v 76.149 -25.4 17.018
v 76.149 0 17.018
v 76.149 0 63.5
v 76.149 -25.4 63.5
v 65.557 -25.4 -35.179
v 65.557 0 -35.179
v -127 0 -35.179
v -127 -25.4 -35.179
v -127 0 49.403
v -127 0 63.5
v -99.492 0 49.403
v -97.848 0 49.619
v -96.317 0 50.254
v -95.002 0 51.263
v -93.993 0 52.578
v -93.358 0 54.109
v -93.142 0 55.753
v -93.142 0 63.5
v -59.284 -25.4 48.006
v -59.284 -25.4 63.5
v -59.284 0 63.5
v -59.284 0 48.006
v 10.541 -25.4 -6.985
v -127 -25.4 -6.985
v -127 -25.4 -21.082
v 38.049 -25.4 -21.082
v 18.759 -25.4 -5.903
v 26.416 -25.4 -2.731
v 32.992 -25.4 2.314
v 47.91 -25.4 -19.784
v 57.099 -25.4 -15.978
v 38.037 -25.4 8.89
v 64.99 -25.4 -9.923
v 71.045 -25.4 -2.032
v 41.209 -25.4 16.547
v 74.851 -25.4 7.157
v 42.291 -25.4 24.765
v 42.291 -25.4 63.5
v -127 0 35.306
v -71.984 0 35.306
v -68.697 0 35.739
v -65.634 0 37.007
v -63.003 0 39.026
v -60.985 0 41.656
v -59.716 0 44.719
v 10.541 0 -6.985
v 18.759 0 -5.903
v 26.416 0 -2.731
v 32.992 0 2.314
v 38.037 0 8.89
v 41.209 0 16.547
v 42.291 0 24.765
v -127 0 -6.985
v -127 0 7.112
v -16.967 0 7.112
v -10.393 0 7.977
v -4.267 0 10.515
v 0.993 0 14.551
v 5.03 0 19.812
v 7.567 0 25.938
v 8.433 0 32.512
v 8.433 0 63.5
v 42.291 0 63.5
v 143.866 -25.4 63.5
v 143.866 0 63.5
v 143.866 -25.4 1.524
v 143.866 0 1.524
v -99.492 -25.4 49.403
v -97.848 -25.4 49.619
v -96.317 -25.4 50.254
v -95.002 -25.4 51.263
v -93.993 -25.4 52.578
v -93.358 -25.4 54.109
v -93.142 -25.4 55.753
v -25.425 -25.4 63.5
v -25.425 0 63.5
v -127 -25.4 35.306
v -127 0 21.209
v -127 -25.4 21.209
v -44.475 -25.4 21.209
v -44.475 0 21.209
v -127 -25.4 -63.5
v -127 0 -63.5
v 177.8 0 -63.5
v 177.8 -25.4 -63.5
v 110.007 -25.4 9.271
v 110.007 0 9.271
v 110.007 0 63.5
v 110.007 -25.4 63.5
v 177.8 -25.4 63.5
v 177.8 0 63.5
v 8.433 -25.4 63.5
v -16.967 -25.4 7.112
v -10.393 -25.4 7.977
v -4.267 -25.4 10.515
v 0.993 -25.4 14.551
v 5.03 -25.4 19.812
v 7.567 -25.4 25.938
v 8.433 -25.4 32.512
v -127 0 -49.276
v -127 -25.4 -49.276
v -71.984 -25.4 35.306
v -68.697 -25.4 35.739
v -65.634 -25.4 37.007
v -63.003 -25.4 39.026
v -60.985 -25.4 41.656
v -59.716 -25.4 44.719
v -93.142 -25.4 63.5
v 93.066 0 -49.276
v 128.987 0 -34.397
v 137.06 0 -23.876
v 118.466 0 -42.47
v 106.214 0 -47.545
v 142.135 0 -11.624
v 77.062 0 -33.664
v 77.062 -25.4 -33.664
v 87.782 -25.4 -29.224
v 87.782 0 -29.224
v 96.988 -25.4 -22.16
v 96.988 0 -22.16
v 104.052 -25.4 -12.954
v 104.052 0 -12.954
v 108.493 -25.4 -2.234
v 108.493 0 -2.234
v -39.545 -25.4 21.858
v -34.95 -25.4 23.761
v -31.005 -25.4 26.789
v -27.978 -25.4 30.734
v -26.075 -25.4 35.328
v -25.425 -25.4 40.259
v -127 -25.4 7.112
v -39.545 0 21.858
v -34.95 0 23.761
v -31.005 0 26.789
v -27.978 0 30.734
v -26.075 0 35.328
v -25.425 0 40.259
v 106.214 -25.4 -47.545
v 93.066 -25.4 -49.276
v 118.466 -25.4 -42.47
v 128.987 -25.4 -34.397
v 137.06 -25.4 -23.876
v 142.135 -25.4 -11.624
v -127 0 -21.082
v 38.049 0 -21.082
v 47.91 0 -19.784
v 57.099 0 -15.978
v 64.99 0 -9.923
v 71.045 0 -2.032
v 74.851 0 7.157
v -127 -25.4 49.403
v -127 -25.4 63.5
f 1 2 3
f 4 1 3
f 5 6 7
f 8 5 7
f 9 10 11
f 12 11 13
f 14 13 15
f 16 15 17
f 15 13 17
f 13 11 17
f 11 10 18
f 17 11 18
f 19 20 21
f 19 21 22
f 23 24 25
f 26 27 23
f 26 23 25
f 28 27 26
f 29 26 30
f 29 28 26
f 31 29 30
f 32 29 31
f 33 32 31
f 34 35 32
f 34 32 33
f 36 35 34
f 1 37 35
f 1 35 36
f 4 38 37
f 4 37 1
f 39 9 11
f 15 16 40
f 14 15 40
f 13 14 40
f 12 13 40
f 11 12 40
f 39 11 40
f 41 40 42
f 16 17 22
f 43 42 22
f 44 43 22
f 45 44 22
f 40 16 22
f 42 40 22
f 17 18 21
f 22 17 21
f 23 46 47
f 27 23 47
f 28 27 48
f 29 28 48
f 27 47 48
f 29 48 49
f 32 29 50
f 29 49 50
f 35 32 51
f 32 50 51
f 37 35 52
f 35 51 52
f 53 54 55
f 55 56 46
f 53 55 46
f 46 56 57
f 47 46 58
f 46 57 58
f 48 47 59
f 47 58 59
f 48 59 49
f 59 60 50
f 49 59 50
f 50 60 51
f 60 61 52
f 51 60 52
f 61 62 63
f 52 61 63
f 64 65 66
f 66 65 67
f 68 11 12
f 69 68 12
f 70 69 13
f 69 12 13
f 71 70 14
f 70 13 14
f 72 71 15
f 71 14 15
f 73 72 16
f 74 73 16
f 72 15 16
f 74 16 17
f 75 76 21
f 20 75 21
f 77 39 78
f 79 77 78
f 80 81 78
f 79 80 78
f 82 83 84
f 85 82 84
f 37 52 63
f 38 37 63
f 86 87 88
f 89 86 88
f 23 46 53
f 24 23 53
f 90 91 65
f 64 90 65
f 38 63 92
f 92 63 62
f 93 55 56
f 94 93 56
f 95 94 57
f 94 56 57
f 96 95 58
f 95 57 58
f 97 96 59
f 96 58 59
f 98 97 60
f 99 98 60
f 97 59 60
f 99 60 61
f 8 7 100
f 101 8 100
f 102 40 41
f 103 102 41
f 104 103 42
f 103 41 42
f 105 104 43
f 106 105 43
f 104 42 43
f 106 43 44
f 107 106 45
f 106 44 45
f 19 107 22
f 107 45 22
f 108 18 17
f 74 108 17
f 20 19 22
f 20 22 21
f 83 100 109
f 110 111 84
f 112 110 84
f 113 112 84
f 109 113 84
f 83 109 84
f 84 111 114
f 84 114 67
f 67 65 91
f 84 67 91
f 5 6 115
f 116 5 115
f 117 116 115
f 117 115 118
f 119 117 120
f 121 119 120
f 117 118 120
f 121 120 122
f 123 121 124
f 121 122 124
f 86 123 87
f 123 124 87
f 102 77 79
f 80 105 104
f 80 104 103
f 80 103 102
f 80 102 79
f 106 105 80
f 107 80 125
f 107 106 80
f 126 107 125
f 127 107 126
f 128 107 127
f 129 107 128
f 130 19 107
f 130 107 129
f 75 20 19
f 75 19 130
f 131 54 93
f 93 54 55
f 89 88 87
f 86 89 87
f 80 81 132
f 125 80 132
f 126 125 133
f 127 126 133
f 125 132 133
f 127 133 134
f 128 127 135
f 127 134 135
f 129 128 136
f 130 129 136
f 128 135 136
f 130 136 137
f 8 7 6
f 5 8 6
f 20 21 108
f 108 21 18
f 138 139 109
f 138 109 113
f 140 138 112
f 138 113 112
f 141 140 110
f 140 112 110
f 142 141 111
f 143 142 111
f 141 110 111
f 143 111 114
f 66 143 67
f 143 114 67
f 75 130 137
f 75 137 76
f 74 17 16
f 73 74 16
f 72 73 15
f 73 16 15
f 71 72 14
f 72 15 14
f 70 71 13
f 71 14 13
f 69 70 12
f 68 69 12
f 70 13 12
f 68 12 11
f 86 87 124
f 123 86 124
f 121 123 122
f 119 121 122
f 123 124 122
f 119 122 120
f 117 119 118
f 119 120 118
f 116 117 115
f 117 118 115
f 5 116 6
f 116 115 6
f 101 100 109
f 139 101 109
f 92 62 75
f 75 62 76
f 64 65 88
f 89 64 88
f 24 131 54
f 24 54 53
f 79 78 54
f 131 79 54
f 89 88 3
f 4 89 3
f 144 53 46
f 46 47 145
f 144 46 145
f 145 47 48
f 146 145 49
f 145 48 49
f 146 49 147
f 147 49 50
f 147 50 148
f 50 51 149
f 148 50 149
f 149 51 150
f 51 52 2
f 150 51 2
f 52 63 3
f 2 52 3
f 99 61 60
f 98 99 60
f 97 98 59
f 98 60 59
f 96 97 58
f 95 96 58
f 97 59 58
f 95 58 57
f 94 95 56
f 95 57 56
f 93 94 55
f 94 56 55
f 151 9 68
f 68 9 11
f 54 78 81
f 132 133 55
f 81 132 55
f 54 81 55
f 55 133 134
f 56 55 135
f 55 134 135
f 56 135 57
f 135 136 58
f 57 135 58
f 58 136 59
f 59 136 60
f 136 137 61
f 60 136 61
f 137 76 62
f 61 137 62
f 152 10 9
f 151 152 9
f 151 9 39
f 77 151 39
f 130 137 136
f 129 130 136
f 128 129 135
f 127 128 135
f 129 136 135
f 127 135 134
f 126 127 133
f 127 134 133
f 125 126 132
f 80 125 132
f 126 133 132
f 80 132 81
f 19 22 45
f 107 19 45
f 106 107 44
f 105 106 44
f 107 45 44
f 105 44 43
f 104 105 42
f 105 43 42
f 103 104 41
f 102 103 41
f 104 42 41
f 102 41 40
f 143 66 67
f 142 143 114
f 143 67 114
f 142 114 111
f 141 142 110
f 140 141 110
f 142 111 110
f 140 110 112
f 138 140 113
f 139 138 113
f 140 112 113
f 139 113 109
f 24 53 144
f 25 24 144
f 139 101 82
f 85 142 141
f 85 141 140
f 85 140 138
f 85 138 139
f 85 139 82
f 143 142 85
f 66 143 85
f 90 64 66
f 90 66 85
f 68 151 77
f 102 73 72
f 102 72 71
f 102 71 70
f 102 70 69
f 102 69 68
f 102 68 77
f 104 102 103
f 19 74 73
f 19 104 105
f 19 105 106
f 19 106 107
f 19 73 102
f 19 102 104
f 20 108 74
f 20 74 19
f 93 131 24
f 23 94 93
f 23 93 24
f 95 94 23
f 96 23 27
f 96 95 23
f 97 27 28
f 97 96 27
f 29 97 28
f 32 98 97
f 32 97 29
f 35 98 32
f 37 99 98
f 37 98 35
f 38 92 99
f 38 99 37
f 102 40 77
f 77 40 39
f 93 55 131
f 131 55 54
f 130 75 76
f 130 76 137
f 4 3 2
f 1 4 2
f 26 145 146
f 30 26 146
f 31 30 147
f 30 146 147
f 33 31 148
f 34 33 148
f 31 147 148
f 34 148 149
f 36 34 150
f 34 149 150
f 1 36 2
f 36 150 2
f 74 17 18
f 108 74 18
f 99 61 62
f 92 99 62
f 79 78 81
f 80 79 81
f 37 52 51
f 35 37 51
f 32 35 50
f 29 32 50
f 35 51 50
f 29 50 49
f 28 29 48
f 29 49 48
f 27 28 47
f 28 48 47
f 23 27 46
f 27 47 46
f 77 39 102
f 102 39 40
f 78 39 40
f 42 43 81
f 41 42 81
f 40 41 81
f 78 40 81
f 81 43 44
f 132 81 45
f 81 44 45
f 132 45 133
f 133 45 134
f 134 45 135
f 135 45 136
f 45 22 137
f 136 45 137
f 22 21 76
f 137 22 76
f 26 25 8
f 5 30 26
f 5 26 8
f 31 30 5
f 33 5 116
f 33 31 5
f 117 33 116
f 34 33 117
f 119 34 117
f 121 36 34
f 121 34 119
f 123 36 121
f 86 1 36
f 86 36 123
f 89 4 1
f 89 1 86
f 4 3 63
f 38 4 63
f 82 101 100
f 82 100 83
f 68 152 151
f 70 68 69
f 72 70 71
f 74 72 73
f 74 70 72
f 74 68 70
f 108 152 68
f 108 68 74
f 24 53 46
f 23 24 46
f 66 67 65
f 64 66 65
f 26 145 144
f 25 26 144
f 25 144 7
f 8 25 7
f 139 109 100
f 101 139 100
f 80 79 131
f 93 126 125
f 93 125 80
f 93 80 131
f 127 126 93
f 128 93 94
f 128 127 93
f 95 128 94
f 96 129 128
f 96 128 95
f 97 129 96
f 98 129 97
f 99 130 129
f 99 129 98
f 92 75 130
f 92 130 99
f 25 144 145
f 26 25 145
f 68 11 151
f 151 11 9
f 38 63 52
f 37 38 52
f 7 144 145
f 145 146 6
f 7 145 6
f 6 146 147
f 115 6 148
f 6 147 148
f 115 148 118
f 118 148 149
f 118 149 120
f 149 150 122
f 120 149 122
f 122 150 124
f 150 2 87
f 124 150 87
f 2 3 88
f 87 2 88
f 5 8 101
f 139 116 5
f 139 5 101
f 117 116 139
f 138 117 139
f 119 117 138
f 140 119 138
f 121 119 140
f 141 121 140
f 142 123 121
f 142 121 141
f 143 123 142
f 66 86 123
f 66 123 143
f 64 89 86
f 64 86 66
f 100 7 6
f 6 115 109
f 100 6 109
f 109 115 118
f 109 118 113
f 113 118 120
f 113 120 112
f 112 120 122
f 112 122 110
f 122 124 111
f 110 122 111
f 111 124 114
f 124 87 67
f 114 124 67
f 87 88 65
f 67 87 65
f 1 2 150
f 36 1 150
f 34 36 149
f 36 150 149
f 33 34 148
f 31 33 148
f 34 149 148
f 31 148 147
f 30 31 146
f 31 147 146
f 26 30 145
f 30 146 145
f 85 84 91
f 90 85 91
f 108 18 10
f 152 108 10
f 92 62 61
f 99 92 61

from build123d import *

# Parameters (mm, degrees)
F1_DEPTH = 25.4
F2_DEPTH = 25.4


with BuildPart() as f1:
    # F0 (on Front) → F1 (new body)
    with BuildSketch(Plane.XZ):
        with BuildLine():
            Line((-93.1418, 55.753), (-93.1418, 63.5))
            Line((-93.1418, 63.5), (-127, 63.5))
            Line((-127, 63.5), (-127, 49.403))
            Line((-127, 49.403), (-99.4918, 49.403))
            ThreePointArc((-99.4918, 49.403), (-95.001672, 51.262872), (-93.1418, 55.753))
        make_face()
        with BuildLine():
            Line((-25.4254, 40.259), (-25.4254, 63.5))
            Line((-25.4254, 63.5), (-59.2836, 63.5))
            Line((-59.2836, 63.5), (-59.2836, 48.006))
            ThreePointArc((-59.2836, 48.006), (-63.003344, 39.025744), (-71.9836, 35.306))
            Line((-71.9836, 35.306), (-127, 35.306))
            Line((-127, 35.306), (-127, 21.209))
            Line((-127, 21.209), (-44.4754, 21.209))
            ThreePointArc((-44.4754, 21.209), (-31.005016, 26.788616), (-25.4254, 40.259))
        make_face()
        with BuildLine():
            Line((42.291, 24.765), (42.291, 63.5))
            Line((42.291, 63.5), (8.4328, 63.5))
            Line((8.4328, 63.5), (8.4328, 32.512))
            ThreePointArc((8.4328, 32.512), (0.993312, 14.551488), (-16.9672, 7.112))
            Line((-16.9672, 7.112), (-127, 7.112))
            Line((-127, 7.112), (-127, -6.985))
            Line((-127, -6.985), (10.541, -6.985))
            ThreePointArc((10.541, -6.985), (32.99164, 2.31436), (42.291, 24.765))
        make_face()
        with BuildLine():
            Line((110.0074, 9.271), (110.0074, 63.5))
            Line((110.0074, 63.5), (76.1492, 63.5))
            Line((76.1492, 63.5), (76.1492, 17.018))
            ThreePointArc((76.1492, 17.018), (64.989968, -9.922768), (38.0492, -21.082))
            Line((38.0492, -21.082), (-127, -21.082))
            Line((-127, -21.082), (-127, -35.179))
            Line((-127, -35.179), (65.5574, -35.179))
            ThreePointArc((65.5574, -35.179), (96.988296, -22.159896), (110.0074, 9.271))
        make_face()
        with BuildLine():
            Line((177.8, -63.5), (177.8, 63.5))
            Line((177.8, 63.5), (143.8656, 63.5))
            Line((143.8656, 63.5), (143.8656, 1.524))
            ThreePointArc((143.8656, 1.524), (128.986624, -34.397024), (93.0656, -49.276))
            Line((93.0656, -49.276), (-127, -49.276))
            Line((-127, -49.276), (-127, -63.5))
            Line((-127, -63.5), (177.8, -63.5))
        make_face()
    extrude(amount=F1_DEPTH)


with BuildPart() as f2:
    # F0 (on Front) → F2 (new body)
    with BuildSketch(Plane.XZ):
        with BuildLine():
            Line((143.8656, 1.524), (143.8656, 63.5))
            Line((143.8656, 63.5), (110.0074, 63.5))
            Line((110.0074, 63.5), (110.0074, 9.271))
            ThreePointArc((110.0074, 9.271), (96.988296, -22.159896), (65.5574, -35.179))
            Line((65.5574, -35.179), (-127, -35.179))
            Line((-127, -35.179), (-127, -49.276))
            Line((-127, -49.276), (93.0656, -49.276))
            ThreePointArc((93.0656, -49.276), (128.986624, -34.397024), (143.8656, 1.524))
        make_face()
        with BuildLine():
            Line((76.1492, 17.018), (76.1492, 63.5))
            Line((76.1492, 63.5), (42.291, 63.5))
            Line((42.291, 63.5), (42.291, 24.765))
            ThreePointArc((42.291, 24.765), (32.99164, 2.31436), (10.541, -6.985))
            Line((10.541, -6.985), (-127, -6.985))
            Line((-127, -6.985), (-127, -21.082))
            Line((-127, -21.082), (38.0492, -21.082))
            ThreePointArc((38.0492, -21.082), (64.989968, -9.922768), (76.1492, 17.018))
        make_face()
        with BuildLine():
            Line((8.4328, 32.512), (8.4328, 63.5))
            Line((8.4328, 63.5), (-25.4254, 63.5))
            Line((-25.4254, 63.5), (-25.4254, 40.259))
            ThreePointArc((-25.4254, 40.259), (-31.005016, 26.788616), (-44.4754, 21.209))
            Line((-44.4754, 21.209), (-127, 21.209))
            Line((-127, 21.209), (-127, 7.112))
            Line((-127, 7.112), (-16.9672, 7.112))
            ThreePointArc((-16.9672, 7.112), (0.993312, 14.551488), (8.4328, 32.512))
        make_face()
        with BuildLine():
            Line((-59.2836, 48.006), (-59.2836, 63.5))
            Line((-59.2836, 63.5), (-93.1418, 63.5))
            Line((-93.1418, 63.5), (-93.1418, 55.753))
            ThreePointArc((-93.1418, 55.753), (-95.001672, 51.262872), (-99.4918, 49.403))
            Line((-99.4918, 49.403), (-127, 49.403))
            Line((-127, 49.403), (-127, 35.306))
            Line((-127, 35.306), (-71.9836, 35.306))
            ThreePointArc((-71.9836, 35.306), (-63.003344, 39.025744), (-59.2836, 48.006))
        make_face()
    extrude(amount=F2_DEPTH)


solid = Compound([f1.part, f2.part])
